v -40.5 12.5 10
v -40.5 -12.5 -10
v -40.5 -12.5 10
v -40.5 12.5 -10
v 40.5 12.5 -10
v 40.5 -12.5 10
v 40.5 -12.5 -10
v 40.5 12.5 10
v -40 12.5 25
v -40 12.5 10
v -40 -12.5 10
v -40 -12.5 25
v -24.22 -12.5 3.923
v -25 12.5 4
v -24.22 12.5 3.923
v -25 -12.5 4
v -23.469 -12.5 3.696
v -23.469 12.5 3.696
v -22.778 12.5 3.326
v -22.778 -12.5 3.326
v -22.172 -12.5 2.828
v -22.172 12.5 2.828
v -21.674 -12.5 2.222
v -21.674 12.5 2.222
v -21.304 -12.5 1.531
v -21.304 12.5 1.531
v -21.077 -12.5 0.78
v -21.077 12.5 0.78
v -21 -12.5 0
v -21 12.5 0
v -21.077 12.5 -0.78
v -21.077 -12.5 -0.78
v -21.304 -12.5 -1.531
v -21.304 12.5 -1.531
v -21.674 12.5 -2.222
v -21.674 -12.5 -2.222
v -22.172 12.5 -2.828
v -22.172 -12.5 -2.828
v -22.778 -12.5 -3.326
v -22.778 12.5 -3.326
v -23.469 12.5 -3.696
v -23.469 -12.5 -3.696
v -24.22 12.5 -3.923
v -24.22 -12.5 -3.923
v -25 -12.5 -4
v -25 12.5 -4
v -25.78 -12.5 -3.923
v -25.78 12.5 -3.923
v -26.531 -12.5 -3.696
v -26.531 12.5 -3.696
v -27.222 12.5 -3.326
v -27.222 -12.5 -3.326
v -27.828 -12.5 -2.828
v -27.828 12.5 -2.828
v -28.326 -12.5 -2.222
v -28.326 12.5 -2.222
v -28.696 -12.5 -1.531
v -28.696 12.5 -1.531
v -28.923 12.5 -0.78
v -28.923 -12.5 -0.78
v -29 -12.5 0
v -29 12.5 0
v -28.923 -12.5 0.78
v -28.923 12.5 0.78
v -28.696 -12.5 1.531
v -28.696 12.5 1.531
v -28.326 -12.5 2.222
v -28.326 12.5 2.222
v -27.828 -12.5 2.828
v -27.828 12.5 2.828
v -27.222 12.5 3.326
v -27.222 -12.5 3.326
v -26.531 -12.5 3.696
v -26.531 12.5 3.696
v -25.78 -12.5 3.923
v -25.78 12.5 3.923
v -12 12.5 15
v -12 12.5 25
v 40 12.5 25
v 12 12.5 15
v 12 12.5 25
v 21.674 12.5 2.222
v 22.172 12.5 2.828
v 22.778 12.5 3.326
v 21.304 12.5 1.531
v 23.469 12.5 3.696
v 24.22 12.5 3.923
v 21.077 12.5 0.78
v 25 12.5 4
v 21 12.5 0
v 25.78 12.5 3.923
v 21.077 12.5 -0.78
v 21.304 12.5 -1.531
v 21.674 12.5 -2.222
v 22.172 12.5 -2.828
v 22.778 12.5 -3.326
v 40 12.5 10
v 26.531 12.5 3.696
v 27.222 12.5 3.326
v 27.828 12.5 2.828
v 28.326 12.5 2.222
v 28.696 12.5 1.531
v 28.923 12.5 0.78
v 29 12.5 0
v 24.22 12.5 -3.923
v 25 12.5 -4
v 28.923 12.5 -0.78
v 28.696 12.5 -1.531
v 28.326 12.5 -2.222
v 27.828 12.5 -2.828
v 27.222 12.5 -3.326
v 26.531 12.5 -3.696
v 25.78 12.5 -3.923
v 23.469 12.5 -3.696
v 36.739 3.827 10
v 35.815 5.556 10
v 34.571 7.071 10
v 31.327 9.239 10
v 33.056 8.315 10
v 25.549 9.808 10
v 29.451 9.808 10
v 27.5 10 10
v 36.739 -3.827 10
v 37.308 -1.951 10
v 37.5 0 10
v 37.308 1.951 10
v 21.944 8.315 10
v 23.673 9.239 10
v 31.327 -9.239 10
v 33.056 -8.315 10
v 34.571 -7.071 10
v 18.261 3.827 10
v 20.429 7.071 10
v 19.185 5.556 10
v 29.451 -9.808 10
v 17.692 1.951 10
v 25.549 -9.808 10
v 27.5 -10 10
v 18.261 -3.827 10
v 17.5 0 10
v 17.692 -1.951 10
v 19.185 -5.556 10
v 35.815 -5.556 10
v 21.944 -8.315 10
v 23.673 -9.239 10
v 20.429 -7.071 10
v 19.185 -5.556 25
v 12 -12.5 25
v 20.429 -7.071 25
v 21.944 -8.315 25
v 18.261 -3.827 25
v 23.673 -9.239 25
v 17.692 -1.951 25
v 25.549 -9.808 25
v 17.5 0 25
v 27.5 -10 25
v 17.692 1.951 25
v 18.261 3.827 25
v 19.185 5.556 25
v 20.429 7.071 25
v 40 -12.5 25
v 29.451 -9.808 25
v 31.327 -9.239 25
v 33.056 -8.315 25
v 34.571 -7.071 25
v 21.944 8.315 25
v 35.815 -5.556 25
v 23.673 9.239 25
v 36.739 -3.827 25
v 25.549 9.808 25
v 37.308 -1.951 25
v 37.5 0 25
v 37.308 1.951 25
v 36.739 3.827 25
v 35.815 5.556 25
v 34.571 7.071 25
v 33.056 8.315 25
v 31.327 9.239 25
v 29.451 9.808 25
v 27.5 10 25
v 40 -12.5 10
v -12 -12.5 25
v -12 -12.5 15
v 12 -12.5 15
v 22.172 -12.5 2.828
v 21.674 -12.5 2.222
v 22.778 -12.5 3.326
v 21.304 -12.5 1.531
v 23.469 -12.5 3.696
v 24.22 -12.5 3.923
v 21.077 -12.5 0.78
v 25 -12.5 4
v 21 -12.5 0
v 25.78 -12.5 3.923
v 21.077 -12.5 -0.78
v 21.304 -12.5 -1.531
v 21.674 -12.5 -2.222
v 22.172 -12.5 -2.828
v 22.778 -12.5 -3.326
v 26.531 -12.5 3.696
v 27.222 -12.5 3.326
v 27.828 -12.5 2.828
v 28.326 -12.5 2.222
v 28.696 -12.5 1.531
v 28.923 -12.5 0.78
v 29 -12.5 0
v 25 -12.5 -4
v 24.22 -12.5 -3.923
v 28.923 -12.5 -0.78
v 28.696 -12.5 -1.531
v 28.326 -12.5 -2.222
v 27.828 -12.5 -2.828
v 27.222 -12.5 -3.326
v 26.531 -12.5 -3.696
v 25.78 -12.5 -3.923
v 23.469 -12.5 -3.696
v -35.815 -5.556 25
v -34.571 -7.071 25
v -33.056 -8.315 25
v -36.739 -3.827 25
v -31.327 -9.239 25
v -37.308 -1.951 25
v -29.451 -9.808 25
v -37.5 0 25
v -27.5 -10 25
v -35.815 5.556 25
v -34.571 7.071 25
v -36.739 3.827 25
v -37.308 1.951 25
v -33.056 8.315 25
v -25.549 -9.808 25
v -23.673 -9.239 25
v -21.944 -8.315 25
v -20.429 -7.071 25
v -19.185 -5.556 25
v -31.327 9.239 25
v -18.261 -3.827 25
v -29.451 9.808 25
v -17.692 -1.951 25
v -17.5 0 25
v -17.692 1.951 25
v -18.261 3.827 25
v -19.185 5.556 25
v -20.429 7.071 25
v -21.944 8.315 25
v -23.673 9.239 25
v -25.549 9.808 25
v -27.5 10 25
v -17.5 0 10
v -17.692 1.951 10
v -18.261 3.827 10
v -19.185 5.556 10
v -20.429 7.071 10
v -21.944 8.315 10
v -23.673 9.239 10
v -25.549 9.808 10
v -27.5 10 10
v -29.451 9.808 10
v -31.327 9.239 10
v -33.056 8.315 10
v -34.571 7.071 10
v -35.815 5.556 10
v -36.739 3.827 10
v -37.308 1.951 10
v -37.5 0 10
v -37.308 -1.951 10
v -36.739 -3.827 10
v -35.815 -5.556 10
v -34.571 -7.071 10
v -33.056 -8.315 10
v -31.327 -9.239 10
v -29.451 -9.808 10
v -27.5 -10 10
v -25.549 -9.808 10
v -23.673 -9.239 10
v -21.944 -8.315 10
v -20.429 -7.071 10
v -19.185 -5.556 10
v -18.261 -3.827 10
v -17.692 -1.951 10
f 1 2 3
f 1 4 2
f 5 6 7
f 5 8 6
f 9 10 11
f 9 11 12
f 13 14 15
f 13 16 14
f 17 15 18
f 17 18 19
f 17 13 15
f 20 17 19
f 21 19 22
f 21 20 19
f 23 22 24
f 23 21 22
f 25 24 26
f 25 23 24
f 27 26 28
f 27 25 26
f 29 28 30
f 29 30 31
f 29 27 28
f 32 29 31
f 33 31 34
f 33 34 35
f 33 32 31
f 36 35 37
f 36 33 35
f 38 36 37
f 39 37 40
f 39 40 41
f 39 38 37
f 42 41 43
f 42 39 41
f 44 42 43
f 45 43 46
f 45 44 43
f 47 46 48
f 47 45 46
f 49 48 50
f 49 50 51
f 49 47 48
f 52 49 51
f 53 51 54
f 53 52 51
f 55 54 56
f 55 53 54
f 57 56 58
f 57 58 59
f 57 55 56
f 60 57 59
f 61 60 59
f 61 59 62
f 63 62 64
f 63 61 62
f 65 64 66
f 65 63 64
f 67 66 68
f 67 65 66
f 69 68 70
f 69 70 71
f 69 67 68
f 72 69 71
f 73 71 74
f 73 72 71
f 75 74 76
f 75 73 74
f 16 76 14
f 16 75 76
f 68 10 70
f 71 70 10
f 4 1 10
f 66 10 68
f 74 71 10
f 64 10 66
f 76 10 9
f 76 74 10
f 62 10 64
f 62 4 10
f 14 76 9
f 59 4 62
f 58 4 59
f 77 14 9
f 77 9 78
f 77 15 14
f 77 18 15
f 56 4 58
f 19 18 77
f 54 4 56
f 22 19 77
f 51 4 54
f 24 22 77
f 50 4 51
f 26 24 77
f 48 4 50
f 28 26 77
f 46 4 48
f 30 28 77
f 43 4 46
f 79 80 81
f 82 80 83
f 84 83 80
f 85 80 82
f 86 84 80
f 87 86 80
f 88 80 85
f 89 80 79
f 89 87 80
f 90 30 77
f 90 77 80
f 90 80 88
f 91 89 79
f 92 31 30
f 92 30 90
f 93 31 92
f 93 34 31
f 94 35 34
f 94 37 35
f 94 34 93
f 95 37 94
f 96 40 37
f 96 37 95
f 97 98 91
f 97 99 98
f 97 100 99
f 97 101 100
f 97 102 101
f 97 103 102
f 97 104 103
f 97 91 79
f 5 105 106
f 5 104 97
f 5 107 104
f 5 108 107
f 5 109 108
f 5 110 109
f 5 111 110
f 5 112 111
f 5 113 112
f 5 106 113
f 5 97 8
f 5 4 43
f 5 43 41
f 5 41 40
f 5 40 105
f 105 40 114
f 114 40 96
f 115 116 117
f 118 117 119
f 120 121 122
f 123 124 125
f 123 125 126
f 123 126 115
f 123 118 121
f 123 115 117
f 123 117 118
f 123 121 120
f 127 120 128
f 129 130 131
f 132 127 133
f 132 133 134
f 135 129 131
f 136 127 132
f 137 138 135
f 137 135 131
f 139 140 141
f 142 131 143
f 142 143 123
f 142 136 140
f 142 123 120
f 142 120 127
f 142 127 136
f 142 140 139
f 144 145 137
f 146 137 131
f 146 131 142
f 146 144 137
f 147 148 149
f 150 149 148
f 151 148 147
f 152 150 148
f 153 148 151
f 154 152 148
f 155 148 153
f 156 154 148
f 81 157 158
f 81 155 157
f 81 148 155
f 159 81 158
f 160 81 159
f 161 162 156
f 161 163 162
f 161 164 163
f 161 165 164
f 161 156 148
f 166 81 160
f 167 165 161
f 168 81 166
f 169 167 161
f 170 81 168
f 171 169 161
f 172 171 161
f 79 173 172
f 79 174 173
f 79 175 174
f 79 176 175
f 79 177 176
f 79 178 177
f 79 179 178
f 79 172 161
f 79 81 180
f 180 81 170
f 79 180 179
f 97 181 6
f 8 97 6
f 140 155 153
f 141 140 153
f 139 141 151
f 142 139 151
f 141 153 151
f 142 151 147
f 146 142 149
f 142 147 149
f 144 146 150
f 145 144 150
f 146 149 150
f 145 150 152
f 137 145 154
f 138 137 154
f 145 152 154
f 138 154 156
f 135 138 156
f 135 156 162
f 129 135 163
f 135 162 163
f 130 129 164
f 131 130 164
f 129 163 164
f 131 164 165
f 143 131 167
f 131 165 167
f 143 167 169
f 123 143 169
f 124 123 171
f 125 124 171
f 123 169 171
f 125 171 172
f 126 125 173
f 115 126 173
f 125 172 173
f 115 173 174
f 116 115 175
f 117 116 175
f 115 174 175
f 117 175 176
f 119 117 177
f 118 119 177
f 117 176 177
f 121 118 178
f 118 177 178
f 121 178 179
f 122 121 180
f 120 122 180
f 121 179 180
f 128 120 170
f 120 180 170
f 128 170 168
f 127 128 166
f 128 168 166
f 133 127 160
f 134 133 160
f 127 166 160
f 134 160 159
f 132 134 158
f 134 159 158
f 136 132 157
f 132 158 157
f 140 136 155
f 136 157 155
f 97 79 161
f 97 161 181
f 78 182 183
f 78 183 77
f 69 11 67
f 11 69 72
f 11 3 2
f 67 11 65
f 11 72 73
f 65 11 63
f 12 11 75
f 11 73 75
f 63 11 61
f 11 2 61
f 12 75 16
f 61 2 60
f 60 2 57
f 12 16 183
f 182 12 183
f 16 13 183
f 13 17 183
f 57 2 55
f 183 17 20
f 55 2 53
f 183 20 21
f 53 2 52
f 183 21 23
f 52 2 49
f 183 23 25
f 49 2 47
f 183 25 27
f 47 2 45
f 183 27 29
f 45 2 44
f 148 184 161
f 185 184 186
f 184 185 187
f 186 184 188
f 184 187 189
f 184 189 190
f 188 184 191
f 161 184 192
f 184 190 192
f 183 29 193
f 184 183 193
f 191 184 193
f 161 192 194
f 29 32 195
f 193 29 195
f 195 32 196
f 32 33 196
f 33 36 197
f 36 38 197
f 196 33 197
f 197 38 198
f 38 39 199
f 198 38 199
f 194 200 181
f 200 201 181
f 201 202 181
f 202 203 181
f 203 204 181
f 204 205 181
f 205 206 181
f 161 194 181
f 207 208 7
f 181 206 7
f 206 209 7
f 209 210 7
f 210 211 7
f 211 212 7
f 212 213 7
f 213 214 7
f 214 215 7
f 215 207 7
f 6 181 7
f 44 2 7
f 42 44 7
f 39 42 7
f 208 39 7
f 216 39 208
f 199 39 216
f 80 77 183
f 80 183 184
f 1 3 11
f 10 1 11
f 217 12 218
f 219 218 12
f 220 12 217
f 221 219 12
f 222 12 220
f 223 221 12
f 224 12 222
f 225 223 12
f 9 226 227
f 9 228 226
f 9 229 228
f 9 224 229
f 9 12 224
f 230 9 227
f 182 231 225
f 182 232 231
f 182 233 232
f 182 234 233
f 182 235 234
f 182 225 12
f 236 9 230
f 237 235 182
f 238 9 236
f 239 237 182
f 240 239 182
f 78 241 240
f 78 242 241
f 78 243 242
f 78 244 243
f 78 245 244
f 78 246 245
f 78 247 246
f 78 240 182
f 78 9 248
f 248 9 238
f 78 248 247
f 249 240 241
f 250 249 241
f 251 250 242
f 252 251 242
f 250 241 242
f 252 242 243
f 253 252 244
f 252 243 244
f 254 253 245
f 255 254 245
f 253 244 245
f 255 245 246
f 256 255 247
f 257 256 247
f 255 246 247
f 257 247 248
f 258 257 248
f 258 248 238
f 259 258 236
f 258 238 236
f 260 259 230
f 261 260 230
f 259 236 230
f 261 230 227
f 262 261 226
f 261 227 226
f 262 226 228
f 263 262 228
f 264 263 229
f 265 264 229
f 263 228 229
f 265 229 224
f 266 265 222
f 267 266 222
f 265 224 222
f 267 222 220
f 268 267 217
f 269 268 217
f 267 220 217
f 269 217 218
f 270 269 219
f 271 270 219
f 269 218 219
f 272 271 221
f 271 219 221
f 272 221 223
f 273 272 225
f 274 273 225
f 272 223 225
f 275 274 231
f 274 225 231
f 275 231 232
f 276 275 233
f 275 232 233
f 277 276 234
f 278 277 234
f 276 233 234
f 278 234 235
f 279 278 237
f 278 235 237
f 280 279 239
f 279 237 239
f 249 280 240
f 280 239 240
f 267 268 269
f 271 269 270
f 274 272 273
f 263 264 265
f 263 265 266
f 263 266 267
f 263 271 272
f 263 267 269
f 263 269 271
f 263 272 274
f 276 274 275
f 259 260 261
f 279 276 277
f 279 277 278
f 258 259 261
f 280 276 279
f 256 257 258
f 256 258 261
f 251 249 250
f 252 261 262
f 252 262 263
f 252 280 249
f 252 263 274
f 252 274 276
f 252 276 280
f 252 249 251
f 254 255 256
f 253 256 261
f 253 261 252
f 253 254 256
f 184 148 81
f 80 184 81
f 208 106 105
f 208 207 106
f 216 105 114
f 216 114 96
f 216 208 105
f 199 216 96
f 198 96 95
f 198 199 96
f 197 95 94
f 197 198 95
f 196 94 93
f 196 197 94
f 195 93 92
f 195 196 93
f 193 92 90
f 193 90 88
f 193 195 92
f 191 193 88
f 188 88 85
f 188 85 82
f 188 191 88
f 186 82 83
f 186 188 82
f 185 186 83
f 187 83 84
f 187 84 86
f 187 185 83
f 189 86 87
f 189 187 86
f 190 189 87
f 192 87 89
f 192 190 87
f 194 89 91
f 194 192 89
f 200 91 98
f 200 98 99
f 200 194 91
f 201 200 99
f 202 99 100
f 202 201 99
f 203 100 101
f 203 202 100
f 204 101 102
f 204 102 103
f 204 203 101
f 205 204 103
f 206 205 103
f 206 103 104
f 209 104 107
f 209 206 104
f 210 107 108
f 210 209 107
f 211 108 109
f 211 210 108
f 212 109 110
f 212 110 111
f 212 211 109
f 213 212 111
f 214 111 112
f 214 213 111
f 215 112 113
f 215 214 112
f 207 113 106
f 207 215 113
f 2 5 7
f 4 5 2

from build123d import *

# Parameters (mm, degrees)
SKETCH1_R           = 4
BOSS_EXTRUDE1_DEPTH = 12.5
SKETCH2_R           = 10
CUT_EXTRUDE1_DEPTH  = 15
SKETCH3_W           = 24
SKETCH3_H           = 31
CUT_EXTRUDE2_DEPTH  = 10


with BuildPart() as part:
    # Sketch1 → Boss-Extrude1 (new, symmetric)
    with BuildSketch(Plane(origin=(0, 0, 0), x_dir=(1, 0, 0), z_dir=(0, 1, 0))):
        Polygon((-40.5, -10), (-40, -10), (-40, -25), (40, -25), (40, -10), (40.5, -10), (40.5, 10), (-40.5, 10), align=None)
        with Locations(Location((-25, 0, 0), (0, 0, 270))):
            Circle(SKETCH1_R, mode=Mode.SUBTRACT)
        with Locations(Location((25, 0, 0), (0, 0, 90))):
            Circle(SKETCH1_R, mode=Mode.SUBTRACT)
    extrude(amount=BOSS_EXTRUDE1_DEPTH, both=True)

    # Sketch2 → Cut-Extrude1 (cut)
    with BuildSketch(Plane.XY.offset(25)):
        with Locations((-27.5, 0)):
            Circle(SKETCH2_R)
        with Locations(Location((27.5, 0, 0), (0, 0, 180))):
            Circle(SKETCH2_R)
    extrude(amount=-CUT_EXTRUDE1_DEPTH, mode=Mode.SUBTRACT)

    # Sketch3 → Cut-Extrude2 (cut)
    with BuildSketch(Plane.XY.offset(25)):
        Rectangle(SKETCH3_W, SKETCH3_H)
    extrude(amount=-CUT_EXTRUDE2_DEPTH, mode=Mode.SUBTRACT)


solid = part.part
